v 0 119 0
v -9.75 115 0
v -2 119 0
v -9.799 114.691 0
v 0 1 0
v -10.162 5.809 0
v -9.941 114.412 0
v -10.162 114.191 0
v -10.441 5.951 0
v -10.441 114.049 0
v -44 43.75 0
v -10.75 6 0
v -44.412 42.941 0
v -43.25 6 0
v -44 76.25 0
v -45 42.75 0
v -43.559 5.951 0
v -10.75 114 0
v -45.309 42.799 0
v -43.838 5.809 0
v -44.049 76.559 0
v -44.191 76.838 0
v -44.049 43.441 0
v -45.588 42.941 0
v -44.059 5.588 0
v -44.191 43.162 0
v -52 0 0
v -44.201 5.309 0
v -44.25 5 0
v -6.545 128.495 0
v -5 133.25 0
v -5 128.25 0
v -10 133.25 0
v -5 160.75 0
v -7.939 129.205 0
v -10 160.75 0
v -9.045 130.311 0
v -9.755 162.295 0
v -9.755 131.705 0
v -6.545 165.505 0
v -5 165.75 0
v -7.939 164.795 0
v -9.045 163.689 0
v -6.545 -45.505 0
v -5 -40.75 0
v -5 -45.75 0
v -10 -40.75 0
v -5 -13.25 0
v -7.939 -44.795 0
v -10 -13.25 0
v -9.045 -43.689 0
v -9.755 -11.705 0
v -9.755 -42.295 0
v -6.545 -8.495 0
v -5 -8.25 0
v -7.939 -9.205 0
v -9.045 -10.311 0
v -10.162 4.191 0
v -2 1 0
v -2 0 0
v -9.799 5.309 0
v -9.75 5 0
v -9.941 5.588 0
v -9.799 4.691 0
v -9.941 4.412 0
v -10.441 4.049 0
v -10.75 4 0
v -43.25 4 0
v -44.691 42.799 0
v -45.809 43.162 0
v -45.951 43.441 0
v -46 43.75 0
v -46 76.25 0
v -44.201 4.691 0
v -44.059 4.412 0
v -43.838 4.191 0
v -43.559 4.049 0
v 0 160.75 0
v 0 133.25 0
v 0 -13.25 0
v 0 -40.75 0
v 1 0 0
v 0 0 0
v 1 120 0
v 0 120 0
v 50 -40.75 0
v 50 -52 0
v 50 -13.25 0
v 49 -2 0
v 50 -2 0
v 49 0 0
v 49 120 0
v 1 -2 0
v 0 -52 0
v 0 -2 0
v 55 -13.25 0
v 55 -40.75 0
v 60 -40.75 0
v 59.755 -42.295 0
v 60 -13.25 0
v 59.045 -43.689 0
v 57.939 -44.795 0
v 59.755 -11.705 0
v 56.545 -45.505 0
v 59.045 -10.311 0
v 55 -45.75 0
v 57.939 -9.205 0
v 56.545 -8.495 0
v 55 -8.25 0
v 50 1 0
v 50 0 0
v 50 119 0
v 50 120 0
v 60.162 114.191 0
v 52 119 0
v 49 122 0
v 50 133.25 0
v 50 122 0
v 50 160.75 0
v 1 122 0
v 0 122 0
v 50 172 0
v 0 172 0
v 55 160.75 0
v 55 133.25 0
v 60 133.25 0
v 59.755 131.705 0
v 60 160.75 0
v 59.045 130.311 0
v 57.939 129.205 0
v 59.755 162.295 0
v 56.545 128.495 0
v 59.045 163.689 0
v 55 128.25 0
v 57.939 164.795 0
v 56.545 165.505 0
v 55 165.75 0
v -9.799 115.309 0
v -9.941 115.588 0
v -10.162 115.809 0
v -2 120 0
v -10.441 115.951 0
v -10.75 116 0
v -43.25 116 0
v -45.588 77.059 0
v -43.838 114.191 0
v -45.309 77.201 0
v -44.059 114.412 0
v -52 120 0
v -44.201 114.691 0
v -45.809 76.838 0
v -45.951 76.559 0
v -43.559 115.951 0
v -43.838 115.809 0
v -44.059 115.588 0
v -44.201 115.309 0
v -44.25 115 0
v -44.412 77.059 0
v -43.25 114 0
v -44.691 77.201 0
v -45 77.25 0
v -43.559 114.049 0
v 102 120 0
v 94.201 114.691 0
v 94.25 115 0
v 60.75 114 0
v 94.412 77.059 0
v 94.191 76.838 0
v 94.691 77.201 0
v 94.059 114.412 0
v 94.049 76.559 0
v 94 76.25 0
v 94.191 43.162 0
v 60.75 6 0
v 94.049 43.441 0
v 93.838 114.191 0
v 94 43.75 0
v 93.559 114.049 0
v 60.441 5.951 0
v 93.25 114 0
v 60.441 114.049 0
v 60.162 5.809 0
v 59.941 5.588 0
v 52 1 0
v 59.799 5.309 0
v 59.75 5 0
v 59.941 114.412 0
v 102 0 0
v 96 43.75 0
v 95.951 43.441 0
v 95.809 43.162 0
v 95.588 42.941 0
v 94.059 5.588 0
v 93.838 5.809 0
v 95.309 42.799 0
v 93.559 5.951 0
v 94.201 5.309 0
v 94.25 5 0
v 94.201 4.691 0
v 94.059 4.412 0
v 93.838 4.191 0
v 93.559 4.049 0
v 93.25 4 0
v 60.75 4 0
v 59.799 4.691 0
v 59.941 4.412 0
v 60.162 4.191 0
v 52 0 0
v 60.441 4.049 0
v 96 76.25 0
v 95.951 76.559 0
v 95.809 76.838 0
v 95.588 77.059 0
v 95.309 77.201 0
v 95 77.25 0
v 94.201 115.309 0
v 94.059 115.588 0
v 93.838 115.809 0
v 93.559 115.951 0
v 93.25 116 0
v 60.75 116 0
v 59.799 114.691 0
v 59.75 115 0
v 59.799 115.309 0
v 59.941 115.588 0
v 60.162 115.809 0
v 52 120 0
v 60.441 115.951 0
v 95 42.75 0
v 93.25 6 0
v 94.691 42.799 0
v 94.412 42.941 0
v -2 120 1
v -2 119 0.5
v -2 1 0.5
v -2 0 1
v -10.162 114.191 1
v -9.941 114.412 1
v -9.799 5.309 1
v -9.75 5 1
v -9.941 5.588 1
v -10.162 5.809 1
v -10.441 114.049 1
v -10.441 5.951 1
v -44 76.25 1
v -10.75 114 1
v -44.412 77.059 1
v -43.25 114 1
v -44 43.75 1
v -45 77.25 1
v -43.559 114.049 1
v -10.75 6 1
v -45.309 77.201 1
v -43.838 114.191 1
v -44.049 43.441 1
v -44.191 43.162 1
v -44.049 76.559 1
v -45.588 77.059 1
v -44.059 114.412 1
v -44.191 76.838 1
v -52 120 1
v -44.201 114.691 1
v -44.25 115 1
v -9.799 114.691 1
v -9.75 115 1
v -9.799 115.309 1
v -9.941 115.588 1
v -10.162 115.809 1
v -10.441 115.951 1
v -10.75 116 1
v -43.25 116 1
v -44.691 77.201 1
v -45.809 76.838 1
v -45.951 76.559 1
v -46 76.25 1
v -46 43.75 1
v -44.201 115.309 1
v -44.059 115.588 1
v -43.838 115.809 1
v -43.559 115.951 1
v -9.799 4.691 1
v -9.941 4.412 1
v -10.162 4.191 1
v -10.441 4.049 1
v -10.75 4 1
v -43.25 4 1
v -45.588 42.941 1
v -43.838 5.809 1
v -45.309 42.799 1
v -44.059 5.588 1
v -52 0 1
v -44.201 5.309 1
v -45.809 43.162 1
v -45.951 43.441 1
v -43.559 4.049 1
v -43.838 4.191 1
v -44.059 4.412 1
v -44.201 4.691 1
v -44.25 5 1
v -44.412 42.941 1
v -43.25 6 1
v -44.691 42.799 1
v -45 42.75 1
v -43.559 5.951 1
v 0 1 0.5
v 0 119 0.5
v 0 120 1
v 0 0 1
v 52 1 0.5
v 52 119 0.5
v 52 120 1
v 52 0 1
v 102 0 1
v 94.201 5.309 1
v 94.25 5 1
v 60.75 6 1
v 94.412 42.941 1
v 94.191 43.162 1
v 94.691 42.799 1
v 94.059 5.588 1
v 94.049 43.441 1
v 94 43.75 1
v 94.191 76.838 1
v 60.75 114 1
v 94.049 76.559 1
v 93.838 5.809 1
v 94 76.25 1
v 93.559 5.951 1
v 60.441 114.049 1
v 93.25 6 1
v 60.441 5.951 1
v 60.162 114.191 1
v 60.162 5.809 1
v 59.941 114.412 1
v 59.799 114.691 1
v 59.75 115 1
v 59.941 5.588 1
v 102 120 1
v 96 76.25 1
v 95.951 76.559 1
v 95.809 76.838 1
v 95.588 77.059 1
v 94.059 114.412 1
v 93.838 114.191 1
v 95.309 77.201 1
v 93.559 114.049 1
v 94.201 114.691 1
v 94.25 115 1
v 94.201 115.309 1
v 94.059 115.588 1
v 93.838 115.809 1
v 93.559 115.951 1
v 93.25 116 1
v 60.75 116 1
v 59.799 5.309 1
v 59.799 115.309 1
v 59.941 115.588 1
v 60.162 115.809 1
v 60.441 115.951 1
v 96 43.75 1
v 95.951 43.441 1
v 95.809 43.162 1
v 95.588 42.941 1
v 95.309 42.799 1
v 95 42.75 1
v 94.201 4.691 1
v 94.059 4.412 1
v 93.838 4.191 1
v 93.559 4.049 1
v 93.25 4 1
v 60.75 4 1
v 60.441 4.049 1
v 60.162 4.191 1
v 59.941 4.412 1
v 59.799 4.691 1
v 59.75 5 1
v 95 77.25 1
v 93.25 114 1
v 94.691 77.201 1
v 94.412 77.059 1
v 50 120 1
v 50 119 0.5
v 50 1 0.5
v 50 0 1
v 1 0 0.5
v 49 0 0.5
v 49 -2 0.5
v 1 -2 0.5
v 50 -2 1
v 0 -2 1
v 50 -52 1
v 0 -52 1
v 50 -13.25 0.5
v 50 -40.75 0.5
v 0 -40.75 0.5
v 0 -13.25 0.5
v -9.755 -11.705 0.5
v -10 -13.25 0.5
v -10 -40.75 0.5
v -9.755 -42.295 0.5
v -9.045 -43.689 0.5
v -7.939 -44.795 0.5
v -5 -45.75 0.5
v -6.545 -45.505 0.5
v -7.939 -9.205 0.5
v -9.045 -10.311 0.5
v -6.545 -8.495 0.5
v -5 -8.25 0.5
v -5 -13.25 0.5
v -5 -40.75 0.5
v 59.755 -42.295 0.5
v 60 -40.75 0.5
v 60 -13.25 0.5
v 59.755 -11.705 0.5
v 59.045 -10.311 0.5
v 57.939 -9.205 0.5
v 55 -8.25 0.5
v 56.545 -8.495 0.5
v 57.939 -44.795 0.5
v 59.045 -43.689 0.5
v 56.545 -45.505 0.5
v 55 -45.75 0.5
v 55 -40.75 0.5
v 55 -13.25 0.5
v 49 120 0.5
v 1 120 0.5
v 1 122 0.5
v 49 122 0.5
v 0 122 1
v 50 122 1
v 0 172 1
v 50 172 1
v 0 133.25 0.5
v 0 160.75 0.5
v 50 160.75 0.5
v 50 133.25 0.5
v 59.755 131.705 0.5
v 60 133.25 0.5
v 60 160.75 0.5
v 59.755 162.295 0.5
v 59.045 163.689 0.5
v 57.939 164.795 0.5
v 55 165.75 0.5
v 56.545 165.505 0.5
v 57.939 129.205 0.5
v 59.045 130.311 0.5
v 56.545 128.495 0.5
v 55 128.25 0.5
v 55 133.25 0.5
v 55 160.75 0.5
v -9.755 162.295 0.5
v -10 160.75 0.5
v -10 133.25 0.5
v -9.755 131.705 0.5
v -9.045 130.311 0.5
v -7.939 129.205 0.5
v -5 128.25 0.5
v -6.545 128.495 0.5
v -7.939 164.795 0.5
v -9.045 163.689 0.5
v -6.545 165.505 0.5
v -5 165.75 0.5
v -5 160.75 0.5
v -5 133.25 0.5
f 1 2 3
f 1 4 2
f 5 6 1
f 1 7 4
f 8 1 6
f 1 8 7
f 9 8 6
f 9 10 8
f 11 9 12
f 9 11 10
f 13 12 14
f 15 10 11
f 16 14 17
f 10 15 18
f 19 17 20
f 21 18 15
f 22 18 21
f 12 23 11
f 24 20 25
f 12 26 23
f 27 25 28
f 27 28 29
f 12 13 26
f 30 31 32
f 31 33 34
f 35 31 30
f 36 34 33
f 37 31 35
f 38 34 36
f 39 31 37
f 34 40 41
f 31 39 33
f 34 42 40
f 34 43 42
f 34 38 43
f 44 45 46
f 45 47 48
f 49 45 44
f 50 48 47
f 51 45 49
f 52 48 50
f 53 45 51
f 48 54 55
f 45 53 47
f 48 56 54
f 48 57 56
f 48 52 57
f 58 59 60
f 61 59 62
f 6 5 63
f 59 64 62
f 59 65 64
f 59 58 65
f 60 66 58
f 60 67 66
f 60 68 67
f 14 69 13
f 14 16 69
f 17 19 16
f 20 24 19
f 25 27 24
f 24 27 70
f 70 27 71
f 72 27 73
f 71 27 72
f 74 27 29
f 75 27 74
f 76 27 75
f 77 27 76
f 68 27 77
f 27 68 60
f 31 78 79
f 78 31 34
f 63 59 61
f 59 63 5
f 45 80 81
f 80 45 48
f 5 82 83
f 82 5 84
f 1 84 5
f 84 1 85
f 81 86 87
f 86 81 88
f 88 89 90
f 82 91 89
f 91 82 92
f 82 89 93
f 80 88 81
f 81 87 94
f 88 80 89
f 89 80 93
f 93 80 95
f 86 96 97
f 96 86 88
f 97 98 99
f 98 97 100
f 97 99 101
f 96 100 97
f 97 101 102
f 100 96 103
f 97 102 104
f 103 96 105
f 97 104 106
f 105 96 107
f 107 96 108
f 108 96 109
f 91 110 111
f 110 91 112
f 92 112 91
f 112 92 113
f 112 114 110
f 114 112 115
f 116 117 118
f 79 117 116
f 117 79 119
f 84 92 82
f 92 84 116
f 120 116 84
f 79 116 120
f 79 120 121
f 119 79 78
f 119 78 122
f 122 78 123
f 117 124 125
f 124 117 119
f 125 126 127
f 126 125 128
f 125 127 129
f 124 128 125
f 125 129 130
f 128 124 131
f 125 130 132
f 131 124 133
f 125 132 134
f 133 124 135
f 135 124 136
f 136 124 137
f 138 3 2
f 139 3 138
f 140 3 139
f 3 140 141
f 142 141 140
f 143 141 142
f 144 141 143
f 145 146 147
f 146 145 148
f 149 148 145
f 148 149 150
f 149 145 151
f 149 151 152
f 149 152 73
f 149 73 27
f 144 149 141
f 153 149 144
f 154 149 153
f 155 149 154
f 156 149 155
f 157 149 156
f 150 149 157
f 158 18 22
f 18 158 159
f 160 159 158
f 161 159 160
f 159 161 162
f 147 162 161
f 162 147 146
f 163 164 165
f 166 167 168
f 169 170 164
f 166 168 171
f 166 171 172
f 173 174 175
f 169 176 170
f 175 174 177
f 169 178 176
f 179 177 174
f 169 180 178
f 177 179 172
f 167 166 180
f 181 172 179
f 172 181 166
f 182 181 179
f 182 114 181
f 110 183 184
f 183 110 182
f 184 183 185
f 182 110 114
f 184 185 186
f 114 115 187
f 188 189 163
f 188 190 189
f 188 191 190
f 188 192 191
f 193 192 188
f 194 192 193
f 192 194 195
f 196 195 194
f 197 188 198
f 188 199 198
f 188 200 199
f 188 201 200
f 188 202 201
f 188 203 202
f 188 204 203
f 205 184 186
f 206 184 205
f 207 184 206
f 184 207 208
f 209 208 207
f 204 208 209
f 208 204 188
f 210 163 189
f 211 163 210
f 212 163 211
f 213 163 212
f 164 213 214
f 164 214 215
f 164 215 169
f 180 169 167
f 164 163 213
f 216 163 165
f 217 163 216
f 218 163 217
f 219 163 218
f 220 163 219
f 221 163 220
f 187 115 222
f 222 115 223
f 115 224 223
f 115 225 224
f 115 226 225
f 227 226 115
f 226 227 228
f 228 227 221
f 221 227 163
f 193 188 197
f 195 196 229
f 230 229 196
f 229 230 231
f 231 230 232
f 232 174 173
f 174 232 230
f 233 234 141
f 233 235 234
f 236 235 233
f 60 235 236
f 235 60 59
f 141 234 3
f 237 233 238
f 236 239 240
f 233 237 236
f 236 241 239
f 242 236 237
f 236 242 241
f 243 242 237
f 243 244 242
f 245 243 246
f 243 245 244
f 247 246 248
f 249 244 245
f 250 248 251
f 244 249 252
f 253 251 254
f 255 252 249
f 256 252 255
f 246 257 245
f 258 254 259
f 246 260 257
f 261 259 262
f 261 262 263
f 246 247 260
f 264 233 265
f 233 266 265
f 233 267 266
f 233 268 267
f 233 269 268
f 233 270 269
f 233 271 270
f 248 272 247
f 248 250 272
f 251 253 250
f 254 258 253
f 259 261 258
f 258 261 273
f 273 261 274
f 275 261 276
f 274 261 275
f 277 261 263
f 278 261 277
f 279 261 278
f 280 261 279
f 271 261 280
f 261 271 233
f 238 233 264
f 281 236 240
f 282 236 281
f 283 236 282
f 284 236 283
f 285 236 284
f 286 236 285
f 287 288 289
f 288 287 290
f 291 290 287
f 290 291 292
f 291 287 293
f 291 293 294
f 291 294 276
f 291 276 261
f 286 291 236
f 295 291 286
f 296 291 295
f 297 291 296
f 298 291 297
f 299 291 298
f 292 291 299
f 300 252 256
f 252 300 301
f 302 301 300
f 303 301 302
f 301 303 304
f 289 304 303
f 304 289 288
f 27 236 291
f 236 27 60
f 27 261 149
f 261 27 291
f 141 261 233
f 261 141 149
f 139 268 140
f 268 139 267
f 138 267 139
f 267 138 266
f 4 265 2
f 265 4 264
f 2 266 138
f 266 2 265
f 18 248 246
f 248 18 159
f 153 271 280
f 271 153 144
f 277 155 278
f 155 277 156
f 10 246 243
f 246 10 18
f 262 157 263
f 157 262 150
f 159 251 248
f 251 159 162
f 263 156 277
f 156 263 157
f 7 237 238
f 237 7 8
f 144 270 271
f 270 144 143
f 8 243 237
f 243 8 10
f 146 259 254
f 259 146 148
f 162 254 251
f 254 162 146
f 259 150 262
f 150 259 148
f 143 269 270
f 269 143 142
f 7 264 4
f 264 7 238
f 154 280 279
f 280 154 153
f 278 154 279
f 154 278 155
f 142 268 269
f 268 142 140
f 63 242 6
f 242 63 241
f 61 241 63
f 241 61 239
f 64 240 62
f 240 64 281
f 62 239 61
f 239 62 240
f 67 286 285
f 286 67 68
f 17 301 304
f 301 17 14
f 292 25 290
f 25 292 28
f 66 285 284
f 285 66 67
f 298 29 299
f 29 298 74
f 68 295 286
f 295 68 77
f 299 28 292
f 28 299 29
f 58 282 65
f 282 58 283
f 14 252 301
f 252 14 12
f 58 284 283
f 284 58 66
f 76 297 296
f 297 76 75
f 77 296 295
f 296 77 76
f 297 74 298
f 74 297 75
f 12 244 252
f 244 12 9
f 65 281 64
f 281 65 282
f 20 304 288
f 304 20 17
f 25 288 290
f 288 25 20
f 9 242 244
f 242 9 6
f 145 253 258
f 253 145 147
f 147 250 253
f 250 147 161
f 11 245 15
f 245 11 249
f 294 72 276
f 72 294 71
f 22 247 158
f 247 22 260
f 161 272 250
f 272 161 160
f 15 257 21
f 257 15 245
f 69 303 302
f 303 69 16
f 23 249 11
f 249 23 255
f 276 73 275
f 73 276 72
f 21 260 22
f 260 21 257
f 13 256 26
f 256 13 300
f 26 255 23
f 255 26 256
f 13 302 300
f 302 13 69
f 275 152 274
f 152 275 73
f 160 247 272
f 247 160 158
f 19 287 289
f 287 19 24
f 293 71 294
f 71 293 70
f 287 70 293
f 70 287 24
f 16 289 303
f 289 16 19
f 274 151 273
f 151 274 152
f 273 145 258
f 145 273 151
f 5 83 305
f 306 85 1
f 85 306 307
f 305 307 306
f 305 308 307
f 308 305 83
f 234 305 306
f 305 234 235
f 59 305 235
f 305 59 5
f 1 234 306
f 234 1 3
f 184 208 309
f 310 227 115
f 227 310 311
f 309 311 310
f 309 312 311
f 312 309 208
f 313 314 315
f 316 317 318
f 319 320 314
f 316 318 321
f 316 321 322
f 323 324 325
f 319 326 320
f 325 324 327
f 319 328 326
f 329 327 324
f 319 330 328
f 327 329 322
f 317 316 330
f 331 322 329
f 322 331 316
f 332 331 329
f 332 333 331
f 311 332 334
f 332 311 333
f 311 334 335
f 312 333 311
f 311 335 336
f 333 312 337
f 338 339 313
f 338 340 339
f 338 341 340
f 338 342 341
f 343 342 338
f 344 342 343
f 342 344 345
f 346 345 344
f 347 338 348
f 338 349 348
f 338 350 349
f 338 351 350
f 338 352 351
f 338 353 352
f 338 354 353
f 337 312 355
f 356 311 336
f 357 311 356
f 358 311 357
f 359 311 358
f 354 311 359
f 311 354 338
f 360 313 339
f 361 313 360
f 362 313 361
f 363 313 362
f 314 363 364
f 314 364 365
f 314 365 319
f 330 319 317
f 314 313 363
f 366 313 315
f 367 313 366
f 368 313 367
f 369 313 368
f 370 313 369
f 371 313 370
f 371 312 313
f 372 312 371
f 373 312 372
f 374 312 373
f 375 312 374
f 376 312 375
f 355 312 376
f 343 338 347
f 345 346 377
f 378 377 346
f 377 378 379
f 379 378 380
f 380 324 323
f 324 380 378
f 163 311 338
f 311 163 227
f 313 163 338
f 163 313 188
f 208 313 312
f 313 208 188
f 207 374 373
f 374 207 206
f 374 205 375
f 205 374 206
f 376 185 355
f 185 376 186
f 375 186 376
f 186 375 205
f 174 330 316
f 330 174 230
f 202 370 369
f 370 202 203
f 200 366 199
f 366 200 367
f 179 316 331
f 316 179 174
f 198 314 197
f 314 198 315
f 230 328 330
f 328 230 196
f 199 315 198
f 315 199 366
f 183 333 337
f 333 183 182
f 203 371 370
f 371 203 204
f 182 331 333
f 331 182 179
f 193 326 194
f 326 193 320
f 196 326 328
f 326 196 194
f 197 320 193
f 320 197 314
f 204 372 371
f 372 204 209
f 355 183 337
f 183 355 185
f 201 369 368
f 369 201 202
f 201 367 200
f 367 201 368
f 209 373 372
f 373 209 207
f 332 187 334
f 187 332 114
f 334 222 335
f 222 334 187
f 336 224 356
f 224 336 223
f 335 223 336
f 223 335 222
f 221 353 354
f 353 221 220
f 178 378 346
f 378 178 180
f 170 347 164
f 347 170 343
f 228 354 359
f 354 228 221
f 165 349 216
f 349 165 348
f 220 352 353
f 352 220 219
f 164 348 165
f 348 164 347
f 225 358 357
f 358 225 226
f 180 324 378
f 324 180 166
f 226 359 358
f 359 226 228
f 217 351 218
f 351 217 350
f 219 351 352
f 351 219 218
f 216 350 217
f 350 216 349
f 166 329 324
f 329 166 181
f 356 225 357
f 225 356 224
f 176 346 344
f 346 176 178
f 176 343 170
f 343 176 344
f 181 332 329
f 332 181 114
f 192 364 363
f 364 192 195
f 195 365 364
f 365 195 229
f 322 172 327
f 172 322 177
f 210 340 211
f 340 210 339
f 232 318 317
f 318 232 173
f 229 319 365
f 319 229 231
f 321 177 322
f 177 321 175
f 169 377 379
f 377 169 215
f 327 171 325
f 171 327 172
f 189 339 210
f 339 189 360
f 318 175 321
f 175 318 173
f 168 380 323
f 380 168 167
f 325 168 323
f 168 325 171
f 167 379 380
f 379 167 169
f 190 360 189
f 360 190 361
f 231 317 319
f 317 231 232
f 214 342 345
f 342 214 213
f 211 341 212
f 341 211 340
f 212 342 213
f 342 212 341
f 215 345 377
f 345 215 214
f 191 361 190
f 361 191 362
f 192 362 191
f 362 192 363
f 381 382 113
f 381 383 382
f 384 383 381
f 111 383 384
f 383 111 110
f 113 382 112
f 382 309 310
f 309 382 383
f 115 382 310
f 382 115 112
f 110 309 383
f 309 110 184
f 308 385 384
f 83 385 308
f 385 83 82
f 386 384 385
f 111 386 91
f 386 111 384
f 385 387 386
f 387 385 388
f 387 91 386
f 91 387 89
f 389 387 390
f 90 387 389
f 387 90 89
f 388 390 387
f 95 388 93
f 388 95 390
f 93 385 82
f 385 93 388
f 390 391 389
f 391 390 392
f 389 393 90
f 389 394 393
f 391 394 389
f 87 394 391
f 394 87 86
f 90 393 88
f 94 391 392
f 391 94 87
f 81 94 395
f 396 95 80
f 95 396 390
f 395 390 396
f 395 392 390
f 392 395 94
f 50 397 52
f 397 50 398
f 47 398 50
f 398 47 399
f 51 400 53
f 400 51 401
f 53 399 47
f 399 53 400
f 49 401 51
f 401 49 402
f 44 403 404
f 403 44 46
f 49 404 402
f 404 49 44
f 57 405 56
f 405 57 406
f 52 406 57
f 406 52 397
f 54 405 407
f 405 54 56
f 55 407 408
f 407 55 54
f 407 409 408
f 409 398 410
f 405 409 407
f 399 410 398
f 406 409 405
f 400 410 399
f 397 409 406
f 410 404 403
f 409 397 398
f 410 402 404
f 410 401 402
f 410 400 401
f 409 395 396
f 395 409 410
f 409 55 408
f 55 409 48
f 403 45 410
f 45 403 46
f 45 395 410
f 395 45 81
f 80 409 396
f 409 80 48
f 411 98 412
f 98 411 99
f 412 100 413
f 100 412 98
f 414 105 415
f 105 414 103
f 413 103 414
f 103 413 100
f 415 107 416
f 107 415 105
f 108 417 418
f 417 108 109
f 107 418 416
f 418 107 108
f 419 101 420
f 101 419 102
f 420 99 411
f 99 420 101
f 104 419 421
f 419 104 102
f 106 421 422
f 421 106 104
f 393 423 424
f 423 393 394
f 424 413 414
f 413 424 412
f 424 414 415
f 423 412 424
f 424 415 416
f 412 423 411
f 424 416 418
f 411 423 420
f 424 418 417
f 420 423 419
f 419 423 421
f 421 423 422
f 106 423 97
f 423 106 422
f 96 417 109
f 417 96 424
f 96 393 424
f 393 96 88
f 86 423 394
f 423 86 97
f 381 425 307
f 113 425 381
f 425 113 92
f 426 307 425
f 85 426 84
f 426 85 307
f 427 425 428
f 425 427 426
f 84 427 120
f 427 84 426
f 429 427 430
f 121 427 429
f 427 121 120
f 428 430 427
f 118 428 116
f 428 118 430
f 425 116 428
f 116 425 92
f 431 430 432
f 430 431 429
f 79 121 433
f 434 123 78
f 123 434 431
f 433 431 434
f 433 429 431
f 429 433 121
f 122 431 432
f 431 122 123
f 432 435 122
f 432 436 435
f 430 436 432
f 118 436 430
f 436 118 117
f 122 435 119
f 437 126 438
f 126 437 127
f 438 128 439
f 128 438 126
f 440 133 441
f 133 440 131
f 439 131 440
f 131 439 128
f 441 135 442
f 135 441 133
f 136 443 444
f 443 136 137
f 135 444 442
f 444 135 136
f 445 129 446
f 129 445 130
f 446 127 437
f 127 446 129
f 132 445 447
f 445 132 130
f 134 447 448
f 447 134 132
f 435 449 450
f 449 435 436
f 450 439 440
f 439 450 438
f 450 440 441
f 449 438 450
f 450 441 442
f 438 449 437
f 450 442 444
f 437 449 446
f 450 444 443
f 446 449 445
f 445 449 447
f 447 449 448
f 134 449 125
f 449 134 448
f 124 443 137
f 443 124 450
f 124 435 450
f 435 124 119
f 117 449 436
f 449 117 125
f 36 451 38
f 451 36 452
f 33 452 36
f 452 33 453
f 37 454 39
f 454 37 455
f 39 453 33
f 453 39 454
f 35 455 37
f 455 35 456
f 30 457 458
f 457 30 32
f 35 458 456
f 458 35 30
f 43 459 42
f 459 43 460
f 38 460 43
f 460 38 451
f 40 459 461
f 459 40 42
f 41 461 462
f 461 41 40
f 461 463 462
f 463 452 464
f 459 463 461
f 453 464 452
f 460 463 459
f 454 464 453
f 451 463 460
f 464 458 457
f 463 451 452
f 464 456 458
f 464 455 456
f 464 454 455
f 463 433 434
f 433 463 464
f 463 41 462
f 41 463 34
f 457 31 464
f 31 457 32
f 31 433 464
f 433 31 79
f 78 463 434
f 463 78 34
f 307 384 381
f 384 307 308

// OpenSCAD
// parameters
box_length = 120;
box_width = 50;
box_height = 50;

printInOne = true;

thickness = 1;
foilHinge_thickness = 0.5;
foilHinge_width = 2;
foilHinge_incision = 2;

anchor_radius = 5;
anchor_width = box_height*3/4;
anchor_baseWidth = anchor_width-2*anchor_radius;
anchor_baseLength = 5;

grommet_width = 1;
grommet_length = anchor_baseWidth+1*anchor_radius;

lid_grommet = true;

lengthCompensation = printInOne == true ? 0 : 2*anchor_baseLength;

length = box_length + lengthCompensation;
width = box_width;
height = box_height;

// main
if(printInOne){
        basicBox();
} else {
    difference(){
        basicBox();
        translate([-(foilHinge_width+height),length,0])
            cube([width+2*height+2*foilHinge_width,height+foilHinge_width,10]);
        translate([-(foilHinge_width+height),length-2*anchor_baseLength,thickness/2])
            cube([width+2*height+2*foilHinge_width,height+foilHinge_width,10]);
    }
}

// modules
module basicBox(){
    linear_extrude(thickness)
    square([width, length]); //base

    translate([0,length,0])
        rotate([0,0,180])
            xSide(); //left side
        
    translate([width,0,0])
            xSide(); //right side

    translate([width,0,0])
        rotate([0,0,180])
            ySide(); //lower side
       
    translate([0,length,0])
            ySide(); //upper side
}

module grommet(){
    linear_extrude(thickness)
        hull() {
            translate([-grommet_length/2,0,0]) 
                circle(grommet_width,$fn=20);
            translate([grommet_length/2,0,0]) 
                circle(grommet_width,$fn=20);
        }
}

module anchor(){
    translate([0,anchor_baseLength,0])
        difference(){
            linear_extrude(foilHinge_thickness)
                hull() {
                    translate([-(anchor_width/2-anchor_radius),0,0]) 
                        circle(anchor_radius,$fn=20);
                    translate([(anchor_width/2-anchor_radius),0,0]) 
                        circle(anchor_radius,$fn=20);
                }
            linear_extrude(foilHinge_thickness)
                translate([-anchor_width/2,-anchor_radius,0])
                    square([anchor_width,anchor_radius]);
                
        }
    translate([-anchor_baseWidth/2,0,0])
        linear_extrude(foilHinge_thickness)
            square([anchor_baseWidth,anchor_baseLength]);
}
    
module xSide(){
    linear_extrude(foilHinge_thickness)
        translate([0,foilHinge_incision/2,0])
            square([foilHinge_width, length-foilHinge_incision]);
    difference(){
        linear_extrude(thickness)
            translate([(foilHinge_width),0,0])
                square([height, length]);
        translate([height/2+foilHinge_width,anchor_baseLength,0])
            grommet();
        translate([height/2+foilHinge_width,length-anchor_baseLength,0])
            grommet();
        if(lid_grommet){
            translate([(height-anchor_baseLength),length/2,0])
                rotate([0,0,90])
                    grommet();
        }
    }
}

module ySide(){
    translate([width,0,0]){
        rotate([0,0,90]){
            linear_extrude(foilHinge_thickness)
                translate([0,foilHinge_incision/2,0])
                    square([foilHinge_width, width-foilHinge_incision]);
            linear_extrude(thickness)
                translate([(foilHinge_width),0,0])
                    square([height, width]);
        }
    }
    
    translate([width,height/2+foilHinge_width,0])
        rotate([0,0,270])
            anchor();
    translate([0,height/2+foilHinge_width,0])
        rotate([0,0,90])
            anchor();
}
